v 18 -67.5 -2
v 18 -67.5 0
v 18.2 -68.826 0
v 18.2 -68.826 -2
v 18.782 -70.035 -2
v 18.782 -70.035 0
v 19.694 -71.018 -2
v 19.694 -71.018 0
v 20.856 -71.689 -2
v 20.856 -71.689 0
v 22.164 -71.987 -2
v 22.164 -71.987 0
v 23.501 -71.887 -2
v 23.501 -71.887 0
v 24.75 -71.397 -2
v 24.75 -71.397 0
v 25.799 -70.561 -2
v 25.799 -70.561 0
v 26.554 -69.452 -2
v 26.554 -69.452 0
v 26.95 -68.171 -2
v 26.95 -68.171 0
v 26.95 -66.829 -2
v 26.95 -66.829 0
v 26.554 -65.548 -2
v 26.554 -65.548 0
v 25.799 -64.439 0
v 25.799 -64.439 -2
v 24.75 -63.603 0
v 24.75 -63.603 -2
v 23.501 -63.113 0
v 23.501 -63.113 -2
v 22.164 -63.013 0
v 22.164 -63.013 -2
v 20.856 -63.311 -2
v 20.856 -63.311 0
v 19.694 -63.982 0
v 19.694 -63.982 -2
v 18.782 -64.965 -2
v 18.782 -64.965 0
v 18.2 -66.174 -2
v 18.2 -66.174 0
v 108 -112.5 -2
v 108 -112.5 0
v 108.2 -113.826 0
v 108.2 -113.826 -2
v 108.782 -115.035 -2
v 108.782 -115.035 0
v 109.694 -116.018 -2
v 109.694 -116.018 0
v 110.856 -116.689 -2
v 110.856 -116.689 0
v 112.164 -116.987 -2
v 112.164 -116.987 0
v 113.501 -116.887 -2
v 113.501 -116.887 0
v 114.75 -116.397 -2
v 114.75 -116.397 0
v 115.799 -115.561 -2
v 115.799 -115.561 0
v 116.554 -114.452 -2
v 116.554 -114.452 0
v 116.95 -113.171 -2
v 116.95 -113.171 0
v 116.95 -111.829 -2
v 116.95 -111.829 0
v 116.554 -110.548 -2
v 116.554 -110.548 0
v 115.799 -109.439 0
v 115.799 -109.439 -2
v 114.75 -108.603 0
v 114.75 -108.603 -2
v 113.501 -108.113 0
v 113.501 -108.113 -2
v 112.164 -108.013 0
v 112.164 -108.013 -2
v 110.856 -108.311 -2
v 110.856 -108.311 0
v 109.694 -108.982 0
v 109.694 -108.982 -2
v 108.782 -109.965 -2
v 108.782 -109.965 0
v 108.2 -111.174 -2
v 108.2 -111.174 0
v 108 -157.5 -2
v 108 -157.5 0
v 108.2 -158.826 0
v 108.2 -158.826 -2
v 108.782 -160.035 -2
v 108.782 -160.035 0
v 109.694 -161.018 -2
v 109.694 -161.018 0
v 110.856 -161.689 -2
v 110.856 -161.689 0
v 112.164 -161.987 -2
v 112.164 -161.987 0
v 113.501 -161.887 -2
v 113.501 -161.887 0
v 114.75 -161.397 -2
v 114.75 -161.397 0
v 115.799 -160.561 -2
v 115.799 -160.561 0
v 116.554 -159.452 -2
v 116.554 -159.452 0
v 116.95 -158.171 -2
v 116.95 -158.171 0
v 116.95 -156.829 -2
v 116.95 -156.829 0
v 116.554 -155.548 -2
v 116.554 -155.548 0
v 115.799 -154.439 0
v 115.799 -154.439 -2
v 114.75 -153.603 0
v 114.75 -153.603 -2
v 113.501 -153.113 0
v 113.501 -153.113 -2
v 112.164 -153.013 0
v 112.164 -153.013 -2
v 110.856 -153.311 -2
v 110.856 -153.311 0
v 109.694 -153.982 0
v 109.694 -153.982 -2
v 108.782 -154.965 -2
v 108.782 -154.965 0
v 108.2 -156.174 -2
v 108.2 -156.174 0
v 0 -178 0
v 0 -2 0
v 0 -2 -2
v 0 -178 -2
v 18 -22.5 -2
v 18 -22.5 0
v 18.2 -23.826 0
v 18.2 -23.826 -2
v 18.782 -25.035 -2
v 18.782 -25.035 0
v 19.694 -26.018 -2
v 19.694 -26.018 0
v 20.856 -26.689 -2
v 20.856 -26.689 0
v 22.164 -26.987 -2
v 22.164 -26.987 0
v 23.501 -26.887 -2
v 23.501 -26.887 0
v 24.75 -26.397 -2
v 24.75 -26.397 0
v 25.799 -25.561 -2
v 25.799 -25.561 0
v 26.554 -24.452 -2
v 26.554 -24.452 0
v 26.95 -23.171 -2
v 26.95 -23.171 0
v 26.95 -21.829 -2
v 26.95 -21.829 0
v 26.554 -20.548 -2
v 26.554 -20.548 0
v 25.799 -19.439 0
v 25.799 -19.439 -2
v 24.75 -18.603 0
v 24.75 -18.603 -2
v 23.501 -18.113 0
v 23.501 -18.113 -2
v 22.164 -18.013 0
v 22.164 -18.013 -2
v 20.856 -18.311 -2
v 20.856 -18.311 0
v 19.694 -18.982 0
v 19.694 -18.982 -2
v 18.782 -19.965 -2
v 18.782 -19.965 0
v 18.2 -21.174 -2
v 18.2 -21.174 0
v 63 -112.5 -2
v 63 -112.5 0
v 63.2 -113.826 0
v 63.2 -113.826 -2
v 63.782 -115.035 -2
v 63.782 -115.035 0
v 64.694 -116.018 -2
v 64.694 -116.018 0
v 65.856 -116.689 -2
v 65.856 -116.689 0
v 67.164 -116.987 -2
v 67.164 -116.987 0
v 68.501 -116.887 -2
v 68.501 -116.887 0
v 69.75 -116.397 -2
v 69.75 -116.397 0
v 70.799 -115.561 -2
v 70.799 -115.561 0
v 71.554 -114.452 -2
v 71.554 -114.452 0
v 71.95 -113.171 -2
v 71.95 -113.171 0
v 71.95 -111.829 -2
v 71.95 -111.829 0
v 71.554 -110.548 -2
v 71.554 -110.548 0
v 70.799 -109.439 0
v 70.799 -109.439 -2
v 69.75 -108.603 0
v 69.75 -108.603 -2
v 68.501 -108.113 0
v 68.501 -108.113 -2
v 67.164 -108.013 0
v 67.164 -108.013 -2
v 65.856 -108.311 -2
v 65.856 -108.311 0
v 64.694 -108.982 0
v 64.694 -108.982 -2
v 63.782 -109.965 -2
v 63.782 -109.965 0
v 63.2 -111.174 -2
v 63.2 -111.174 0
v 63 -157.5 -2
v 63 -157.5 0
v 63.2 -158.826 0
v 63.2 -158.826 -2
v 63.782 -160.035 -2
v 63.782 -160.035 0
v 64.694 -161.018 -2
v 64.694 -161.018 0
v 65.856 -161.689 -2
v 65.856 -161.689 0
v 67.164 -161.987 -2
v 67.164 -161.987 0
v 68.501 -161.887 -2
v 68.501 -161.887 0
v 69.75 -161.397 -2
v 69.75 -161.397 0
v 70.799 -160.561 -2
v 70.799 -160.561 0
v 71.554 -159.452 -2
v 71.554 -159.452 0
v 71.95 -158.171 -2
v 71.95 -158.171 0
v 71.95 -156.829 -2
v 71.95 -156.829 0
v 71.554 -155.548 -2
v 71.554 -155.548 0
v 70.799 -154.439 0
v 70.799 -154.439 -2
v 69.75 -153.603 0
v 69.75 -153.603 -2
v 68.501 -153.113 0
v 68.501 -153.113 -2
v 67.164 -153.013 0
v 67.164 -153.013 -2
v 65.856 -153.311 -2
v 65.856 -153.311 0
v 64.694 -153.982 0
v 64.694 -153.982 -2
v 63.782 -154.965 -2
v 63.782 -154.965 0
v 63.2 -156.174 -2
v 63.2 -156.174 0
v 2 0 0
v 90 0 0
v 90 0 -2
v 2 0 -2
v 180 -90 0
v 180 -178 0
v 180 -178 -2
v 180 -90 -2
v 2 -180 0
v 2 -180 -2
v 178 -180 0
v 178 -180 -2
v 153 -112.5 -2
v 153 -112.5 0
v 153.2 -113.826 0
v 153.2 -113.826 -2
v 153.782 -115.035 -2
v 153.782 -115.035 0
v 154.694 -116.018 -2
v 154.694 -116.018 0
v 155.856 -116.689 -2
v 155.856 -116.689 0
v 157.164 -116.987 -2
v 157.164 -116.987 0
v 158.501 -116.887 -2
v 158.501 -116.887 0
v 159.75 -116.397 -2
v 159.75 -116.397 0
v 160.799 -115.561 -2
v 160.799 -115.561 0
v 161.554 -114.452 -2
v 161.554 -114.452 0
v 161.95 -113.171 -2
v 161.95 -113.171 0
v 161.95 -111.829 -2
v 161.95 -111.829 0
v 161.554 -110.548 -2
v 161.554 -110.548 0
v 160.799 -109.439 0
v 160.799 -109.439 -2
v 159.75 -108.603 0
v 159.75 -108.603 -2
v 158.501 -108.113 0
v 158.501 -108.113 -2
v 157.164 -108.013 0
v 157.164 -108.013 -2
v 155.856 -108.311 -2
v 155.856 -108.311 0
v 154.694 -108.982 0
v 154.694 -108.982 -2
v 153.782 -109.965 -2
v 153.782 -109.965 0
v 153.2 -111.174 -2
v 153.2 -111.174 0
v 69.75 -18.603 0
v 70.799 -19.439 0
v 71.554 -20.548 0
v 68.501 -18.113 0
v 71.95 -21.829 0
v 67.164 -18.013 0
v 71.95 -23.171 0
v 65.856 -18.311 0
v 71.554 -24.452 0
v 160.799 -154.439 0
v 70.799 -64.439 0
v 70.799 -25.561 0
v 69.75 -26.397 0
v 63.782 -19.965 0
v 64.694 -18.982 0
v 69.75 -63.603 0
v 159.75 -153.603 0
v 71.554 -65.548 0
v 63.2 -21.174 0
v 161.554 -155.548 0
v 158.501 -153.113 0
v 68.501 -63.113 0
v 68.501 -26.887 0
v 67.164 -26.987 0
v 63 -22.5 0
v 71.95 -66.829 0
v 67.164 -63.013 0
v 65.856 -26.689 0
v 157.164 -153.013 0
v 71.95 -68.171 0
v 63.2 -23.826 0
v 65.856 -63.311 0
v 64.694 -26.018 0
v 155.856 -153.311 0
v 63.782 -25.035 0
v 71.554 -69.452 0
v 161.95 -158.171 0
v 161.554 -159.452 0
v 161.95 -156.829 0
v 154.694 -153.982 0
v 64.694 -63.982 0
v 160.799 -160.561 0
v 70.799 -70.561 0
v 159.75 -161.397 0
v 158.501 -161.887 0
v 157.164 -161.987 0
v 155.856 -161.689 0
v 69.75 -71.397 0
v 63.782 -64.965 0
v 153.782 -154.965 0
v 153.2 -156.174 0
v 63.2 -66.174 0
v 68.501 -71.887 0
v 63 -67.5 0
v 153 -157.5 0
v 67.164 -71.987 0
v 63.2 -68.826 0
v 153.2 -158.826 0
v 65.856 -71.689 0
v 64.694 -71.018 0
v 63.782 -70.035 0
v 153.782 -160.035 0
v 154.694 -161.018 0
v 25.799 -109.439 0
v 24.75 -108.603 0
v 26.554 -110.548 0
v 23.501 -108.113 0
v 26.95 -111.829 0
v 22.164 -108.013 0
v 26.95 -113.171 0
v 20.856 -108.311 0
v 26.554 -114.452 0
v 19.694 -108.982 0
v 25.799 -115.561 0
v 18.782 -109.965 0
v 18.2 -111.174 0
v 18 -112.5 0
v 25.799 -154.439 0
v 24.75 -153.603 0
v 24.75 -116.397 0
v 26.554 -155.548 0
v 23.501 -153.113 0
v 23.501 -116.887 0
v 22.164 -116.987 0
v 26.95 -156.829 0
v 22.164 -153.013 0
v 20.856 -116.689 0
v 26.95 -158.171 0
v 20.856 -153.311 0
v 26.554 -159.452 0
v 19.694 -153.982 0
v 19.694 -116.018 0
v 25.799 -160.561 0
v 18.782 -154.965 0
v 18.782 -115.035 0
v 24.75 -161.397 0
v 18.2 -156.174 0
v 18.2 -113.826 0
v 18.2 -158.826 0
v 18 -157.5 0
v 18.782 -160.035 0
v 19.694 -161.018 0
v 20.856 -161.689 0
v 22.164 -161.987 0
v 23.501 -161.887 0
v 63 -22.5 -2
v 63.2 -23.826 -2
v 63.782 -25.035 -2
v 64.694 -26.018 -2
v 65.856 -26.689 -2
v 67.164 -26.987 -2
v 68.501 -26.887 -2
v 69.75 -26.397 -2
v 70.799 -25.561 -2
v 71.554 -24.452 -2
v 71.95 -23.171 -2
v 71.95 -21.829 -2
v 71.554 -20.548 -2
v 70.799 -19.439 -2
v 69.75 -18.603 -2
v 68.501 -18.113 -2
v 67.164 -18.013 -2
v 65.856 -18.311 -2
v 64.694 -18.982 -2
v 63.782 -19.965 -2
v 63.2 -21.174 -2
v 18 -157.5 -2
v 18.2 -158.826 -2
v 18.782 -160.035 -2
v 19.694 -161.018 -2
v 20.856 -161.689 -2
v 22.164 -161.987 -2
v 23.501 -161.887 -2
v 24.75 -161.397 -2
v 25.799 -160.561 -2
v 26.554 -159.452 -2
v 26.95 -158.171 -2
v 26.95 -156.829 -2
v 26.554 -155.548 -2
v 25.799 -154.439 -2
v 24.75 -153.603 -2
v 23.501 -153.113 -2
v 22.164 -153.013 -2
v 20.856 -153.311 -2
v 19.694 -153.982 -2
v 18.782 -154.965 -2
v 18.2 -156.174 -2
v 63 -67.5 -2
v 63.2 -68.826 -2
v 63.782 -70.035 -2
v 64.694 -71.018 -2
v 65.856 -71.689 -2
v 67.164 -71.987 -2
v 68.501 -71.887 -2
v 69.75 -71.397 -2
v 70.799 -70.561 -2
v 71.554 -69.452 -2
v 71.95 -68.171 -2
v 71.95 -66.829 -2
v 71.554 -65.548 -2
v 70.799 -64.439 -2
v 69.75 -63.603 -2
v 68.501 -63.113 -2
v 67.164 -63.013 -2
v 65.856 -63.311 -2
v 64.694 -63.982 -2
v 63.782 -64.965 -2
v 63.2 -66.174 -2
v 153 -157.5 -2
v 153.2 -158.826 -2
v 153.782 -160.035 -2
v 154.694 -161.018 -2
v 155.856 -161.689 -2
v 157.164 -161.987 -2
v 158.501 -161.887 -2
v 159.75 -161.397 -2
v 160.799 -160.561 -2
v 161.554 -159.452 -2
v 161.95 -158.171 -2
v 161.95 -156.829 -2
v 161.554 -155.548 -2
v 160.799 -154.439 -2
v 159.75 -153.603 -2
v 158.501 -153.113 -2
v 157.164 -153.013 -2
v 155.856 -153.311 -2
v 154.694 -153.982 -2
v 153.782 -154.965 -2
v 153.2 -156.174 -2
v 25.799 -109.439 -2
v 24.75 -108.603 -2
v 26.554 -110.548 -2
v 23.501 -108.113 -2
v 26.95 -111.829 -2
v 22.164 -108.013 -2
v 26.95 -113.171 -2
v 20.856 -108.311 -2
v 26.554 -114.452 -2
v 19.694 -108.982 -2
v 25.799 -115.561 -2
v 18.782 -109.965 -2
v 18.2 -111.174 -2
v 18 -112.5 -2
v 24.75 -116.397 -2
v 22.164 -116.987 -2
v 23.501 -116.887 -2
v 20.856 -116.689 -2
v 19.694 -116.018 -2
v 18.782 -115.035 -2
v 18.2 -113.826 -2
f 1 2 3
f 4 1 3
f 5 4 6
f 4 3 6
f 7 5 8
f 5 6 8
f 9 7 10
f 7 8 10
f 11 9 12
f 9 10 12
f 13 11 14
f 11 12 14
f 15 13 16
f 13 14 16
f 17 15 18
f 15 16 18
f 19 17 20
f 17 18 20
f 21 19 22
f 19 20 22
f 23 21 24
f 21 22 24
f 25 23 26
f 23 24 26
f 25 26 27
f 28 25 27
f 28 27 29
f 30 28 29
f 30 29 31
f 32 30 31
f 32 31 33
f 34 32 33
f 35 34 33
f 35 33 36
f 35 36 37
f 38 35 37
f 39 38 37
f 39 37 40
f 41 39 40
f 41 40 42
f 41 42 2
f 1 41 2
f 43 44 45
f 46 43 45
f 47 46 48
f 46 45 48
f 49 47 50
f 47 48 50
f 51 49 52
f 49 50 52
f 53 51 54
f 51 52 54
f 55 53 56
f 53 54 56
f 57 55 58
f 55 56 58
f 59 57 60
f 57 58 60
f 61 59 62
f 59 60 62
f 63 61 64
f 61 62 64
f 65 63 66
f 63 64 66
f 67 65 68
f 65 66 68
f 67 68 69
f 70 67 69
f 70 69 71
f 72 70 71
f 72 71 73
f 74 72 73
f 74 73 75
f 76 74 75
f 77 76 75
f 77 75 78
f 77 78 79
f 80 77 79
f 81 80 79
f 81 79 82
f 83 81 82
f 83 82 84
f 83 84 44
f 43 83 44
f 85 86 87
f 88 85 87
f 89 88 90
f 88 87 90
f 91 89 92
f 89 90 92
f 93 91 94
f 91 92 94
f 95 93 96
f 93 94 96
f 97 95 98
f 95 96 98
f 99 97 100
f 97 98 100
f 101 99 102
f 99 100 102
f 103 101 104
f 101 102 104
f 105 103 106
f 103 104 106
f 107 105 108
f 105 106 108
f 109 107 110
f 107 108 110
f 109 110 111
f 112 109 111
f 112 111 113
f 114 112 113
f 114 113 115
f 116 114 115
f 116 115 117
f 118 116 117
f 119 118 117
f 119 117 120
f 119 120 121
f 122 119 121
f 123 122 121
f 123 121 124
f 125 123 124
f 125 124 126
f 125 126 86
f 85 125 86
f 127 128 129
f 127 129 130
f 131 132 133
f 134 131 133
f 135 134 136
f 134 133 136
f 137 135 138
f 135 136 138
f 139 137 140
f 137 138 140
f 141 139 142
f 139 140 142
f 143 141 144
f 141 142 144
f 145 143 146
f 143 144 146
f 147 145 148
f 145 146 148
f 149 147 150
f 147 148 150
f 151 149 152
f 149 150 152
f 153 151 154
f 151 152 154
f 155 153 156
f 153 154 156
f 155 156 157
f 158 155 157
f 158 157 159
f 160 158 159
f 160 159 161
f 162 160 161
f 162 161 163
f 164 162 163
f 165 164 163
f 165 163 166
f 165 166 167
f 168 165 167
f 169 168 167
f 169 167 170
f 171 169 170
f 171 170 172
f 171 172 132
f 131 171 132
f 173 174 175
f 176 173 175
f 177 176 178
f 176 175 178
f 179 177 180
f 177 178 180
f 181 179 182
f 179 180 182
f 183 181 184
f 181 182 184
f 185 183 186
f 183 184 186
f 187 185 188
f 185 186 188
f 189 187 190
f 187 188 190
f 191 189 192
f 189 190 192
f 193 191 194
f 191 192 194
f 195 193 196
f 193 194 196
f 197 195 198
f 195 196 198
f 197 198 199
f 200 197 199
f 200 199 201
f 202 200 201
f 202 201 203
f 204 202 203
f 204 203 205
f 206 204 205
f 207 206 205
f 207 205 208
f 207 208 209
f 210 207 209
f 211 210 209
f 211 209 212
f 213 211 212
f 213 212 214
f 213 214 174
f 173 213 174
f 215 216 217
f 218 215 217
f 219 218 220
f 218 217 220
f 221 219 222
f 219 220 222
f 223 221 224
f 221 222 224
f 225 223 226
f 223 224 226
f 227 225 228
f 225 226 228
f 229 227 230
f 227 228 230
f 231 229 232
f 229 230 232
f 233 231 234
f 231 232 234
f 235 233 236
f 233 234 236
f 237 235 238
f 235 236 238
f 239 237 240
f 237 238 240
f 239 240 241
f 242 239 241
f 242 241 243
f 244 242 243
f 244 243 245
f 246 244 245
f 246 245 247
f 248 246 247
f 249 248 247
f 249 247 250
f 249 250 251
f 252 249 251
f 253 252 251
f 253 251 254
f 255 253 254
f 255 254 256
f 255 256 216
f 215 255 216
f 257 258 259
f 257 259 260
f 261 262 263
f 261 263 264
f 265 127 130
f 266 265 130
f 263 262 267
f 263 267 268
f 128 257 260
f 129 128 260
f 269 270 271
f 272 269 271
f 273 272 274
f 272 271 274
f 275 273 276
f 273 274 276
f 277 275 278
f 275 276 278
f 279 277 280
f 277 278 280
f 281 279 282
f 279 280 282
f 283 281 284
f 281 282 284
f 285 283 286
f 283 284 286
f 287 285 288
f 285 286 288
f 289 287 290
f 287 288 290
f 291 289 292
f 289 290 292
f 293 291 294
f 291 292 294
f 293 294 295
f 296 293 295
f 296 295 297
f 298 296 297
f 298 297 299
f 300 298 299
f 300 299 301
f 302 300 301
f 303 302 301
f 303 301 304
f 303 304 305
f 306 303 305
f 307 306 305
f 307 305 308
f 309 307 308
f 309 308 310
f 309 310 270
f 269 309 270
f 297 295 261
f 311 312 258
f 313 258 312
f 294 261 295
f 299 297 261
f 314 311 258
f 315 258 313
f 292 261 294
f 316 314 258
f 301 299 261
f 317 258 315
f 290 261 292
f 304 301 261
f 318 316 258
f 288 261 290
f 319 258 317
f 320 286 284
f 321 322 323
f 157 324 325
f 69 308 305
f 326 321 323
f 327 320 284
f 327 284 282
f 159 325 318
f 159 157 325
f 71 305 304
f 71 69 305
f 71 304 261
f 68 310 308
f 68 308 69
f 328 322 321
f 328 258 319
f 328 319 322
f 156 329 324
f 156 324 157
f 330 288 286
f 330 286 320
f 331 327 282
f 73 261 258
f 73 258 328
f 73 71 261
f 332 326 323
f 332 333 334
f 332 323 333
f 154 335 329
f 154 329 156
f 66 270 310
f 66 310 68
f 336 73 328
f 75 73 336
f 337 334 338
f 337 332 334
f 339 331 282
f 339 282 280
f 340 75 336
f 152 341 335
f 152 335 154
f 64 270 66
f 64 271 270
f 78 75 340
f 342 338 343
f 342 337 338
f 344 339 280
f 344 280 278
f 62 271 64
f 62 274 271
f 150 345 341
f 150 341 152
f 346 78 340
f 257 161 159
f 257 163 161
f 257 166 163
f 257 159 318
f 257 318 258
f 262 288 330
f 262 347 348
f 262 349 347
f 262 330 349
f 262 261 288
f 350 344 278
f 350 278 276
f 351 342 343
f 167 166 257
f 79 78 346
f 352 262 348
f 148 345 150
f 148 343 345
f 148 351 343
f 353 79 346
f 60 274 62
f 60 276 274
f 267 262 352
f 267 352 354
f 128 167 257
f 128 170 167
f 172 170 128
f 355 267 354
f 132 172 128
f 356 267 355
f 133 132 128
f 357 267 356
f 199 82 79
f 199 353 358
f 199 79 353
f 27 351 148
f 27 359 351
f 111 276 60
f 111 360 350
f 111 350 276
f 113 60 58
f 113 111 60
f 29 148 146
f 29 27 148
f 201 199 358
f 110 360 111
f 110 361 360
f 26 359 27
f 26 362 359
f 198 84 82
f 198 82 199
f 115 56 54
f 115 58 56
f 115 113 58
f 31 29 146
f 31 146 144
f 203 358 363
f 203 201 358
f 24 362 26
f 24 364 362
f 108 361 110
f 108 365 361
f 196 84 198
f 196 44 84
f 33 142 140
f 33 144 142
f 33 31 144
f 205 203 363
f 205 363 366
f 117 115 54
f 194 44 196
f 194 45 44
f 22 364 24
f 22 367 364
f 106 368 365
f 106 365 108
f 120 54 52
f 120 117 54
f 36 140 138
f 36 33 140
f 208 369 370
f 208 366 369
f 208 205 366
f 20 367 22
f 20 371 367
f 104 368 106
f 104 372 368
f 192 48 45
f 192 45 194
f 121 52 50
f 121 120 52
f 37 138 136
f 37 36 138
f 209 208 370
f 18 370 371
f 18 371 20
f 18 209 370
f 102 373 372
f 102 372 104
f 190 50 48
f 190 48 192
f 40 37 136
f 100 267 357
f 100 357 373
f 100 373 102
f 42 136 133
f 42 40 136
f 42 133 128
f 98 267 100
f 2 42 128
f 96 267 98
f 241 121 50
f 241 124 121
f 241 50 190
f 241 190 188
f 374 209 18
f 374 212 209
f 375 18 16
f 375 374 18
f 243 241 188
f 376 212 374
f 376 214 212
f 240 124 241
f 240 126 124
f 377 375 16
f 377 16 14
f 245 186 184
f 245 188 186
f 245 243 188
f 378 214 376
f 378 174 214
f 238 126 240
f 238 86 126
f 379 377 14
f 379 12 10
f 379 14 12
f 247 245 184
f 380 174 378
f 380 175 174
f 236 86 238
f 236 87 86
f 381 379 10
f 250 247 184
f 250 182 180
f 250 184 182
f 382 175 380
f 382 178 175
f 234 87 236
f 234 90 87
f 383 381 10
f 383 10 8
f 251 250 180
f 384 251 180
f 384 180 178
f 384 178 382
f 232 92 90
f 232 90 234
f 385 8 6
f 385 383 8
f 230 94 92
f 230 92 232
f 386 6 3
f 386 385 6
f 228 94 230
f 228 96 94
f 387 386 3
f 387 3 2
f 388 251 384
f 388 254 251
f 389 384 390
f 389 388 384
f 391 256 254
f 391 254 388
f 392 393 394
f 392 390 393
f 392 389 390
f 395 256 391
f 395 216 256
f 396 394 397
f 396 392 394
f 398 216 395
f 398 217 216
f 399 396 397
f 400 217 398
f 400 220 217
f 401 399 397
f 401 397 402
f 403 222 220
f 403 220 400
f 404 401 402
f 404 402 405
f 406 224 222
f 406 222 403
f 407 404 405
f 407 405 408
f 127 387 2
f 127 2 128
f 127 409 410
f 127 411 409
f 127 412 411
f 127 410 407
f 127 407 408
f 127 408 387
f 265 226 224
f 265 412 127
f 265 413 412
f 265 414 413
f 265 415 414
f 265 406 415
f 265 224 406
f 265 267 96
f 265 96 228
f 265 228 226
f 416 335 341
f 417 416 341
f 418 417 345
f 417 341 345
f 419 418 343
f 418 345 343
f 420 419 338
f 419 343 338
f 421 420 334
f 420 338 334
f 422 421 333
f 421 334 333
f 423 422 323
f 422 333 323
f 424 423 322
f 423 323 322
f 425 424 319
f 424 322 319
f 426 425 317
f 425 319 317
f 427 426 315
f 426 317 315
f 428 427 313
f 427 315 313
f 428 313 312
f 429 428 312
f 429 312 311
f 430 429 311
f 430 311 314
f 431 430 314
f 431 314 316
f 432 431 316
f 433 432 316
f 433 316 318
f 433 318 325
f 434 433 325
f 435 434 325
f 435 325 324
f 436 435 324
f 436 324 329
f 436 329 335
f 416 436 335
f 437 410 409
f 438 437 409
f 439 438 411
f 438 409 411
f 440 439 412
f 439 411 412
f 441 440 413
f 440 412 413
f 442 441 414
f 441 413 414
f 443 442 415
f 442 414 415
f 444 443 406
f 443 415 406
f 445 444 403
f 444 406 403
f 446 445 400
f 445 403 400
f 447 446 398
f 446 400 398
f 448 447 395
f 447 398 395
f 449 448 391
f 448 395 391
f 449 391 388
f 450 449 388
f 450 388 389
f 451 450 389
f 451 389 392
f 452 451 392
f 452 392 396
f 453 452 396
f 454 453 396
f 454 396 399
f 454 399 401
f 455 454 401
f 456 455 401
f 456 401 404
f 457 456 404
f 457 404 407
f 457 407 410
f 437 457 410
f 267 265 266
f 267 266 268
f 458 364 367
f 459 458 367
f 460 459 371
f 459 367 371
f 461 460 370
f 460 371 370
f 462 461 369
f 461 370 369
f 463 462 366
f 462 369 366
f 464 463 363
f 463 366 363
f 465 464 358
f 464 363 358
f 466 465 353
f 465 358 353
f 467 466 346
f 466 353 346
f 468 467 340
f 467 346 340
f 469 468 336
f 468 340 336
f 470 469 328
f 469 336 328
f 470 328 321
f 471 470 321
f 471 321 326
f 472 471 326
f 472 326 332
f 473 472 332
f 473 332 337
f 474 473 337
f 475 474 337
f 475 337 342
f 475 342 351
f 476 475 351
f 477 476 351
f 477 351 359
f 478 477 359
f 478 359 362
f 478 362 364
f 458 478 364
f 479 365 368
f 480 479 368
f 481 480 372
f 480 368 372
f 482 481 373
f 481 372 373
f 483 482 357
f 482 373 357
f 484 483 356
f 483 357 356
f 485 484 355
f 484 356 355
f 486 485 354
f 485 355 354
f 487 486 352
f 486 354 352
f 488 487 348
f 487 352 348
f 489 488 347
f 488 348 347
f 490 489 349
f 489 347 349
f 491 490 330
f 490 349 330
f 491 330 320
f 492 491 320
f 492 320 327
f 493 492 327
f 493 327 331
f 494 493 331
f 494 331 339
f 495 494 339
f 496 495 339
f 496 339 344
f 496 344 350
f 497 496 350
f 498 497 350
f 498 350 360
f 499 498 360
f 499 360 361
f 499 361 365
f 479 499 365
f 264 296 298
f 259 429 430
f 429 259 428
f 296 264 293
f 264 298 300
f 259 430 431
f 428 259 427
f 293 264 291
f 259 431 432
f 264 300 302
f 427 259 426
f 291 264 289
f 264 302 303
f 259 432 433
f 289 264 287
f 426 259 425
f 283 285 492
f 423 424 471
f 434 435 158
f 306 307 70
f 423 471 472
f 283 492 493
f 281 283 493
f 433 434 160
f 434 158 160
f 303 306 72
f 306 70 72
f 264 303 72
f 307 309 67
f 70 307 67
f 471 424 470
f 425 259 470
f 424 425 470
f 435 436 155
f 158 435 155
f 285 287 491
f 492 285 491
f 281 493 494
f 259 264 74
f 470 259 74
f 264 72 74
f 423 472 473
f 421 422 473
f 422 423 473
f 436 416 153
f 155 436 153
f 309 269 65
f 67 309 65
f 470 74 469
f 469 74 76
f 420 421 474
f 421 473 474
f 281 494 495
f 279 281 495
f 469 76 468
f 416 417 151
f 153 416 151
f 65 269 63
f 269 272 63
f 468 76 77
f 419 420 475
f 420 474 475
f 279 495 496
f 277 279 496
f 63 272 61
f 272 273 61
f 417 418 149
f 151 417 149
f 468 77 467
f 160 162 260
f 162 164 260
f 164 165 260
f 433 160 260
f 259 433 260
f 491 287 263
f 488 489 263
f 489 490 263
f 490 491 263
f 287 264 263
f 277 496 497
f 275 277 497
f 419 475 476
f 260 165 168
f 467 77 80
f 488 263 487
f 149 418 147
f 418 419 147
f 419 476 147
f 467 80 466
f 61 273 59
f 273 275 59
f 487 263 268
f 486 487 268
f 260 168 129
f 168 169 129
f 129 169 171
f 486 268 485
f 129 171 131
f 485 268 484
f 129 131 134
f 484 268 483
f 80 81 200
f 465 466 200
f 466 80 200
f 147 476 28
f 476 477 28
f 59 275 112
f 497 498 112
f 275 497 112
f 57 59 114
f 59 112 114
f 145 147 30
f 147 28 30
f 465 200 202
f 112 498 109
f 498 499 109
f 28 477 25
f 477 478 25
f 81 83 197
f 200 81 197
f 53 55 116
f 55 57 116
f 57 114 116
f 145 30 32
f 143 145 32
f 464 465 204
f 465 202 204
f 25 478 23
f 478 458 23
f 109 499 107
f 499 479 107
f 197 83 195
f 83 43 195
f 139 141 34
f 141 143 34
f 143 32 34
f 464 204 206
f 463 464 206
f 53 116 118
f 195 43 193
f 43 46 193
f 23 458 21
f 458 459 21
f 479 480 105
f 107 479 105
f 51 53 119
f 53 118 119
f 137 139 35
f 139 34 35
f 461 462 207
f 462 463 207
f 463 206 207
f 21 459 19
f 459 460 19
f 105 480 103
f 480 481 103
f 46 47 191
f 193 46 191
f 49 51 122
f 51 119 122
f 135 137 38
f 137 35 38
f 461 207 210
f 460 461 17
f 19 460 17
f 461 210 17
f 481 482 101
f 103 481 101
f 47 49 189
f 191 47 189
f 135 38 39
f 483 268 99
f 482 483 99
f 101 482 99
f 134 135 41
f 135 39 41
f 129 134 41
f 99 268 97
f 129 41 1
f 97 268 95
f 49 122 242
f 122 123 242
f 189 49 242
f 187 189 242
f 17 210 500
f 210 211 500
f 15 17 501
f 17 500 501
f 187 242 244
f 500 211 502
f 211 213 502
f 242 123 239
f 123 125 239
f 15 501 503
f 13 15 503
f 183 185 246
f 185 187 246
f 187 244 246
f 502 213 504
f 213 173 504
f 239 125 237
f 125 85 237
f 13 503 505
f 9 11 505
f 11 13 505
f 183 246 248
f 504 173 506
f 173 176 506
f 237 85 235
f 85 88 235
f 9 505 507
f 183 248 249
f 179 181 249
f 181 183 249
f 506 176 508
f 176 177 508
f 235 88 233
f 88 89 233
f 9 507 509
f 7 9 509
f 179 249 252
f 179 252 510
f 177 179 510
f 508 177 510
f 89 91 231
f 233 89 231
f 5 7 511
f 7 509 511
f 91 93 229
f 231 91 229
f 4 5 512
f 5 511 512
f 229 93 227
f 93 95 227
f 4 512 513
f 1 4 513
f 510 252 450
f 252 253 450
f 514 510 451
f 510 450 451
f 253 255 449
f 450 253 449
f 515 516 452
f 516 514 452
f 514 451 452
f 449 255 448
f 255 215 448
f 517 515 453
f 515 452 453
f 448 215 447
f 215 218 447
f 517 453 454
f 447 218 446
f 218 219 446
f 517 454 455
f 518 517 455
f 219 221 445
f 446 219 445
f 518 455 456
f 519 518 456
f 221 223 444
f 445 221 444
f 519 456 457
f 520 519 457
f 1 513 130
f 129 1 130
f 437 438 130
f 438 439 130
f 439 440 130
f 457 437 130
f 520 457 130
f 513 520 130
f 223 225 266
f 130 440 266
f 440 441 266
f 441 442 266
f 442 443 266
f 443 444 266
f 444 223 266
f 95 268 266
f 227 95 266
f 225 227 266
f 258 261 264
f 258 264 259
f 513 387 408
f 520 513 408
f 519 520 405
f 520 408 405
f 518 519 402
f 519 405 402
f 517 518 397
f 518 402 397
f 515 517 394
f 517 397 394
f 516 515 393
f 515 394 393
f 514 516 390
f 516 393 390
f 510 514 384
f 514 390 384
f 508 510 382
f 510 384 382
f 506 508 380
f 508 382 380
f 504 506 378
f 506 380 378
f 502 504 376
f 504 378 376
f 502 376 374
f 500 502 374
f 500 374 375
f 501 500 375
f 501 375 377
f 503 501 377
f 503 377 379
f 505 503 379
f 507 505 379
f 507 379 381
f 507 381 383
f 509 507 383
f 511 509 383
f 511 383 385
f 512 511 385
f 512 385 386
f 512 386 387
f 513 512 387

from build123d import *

# Parameters (mm, degrees)
EXTRUDE_1_DEPTH   = 2
HOLE_WIZARD_M81_D = 9
CHAMFER_1_SIZE    = 2


with BuildPart() as part:
    # Эскиз1 → Бобышка-Вытянуть1 (new body)
    with BuildSketch(Plane(origin=(0, 0, 0), x_dir=(1, 0, 0), z_dir=(0, 0, -1))):
        Polygon((0, 0), (0, 180), (180, 180), (180, 90), (90, 0), align=None)
    extrude(amount=EXTRUDE_1_DEPTH)

    # Отверстие с зазором M81 (through all)
    with Locations(Plane(origin=(0, 0, -2), x_dir=(1, 0, 0), z_dir=(0, 0, -1))):
        with Locations((22.5, 157.5), (22.5, 112.5), (22.5, 67.5), (22.5, 22.5), (67.5, 157.5), (67.5, 112.5), (67.5, 67.5), (67.5, 22.5), (112.5, 157.5), (112.5, 112.5), (157.5, 157.5), (157.5, 112.5)):
            Hole(HOLE_WIZARD_M81_D / 2)

    # Фаска1
    chamfer_1_edges = [part.edges().sort_by_distance(p)[0] for p in [
        (0, 0, -1),
        (0, -180, -1),
        (180, -180, -1),
    ]]
    chamfer(chamfer_1_edges, length=CHAMFER_1_SIZE)


solid = part.part
